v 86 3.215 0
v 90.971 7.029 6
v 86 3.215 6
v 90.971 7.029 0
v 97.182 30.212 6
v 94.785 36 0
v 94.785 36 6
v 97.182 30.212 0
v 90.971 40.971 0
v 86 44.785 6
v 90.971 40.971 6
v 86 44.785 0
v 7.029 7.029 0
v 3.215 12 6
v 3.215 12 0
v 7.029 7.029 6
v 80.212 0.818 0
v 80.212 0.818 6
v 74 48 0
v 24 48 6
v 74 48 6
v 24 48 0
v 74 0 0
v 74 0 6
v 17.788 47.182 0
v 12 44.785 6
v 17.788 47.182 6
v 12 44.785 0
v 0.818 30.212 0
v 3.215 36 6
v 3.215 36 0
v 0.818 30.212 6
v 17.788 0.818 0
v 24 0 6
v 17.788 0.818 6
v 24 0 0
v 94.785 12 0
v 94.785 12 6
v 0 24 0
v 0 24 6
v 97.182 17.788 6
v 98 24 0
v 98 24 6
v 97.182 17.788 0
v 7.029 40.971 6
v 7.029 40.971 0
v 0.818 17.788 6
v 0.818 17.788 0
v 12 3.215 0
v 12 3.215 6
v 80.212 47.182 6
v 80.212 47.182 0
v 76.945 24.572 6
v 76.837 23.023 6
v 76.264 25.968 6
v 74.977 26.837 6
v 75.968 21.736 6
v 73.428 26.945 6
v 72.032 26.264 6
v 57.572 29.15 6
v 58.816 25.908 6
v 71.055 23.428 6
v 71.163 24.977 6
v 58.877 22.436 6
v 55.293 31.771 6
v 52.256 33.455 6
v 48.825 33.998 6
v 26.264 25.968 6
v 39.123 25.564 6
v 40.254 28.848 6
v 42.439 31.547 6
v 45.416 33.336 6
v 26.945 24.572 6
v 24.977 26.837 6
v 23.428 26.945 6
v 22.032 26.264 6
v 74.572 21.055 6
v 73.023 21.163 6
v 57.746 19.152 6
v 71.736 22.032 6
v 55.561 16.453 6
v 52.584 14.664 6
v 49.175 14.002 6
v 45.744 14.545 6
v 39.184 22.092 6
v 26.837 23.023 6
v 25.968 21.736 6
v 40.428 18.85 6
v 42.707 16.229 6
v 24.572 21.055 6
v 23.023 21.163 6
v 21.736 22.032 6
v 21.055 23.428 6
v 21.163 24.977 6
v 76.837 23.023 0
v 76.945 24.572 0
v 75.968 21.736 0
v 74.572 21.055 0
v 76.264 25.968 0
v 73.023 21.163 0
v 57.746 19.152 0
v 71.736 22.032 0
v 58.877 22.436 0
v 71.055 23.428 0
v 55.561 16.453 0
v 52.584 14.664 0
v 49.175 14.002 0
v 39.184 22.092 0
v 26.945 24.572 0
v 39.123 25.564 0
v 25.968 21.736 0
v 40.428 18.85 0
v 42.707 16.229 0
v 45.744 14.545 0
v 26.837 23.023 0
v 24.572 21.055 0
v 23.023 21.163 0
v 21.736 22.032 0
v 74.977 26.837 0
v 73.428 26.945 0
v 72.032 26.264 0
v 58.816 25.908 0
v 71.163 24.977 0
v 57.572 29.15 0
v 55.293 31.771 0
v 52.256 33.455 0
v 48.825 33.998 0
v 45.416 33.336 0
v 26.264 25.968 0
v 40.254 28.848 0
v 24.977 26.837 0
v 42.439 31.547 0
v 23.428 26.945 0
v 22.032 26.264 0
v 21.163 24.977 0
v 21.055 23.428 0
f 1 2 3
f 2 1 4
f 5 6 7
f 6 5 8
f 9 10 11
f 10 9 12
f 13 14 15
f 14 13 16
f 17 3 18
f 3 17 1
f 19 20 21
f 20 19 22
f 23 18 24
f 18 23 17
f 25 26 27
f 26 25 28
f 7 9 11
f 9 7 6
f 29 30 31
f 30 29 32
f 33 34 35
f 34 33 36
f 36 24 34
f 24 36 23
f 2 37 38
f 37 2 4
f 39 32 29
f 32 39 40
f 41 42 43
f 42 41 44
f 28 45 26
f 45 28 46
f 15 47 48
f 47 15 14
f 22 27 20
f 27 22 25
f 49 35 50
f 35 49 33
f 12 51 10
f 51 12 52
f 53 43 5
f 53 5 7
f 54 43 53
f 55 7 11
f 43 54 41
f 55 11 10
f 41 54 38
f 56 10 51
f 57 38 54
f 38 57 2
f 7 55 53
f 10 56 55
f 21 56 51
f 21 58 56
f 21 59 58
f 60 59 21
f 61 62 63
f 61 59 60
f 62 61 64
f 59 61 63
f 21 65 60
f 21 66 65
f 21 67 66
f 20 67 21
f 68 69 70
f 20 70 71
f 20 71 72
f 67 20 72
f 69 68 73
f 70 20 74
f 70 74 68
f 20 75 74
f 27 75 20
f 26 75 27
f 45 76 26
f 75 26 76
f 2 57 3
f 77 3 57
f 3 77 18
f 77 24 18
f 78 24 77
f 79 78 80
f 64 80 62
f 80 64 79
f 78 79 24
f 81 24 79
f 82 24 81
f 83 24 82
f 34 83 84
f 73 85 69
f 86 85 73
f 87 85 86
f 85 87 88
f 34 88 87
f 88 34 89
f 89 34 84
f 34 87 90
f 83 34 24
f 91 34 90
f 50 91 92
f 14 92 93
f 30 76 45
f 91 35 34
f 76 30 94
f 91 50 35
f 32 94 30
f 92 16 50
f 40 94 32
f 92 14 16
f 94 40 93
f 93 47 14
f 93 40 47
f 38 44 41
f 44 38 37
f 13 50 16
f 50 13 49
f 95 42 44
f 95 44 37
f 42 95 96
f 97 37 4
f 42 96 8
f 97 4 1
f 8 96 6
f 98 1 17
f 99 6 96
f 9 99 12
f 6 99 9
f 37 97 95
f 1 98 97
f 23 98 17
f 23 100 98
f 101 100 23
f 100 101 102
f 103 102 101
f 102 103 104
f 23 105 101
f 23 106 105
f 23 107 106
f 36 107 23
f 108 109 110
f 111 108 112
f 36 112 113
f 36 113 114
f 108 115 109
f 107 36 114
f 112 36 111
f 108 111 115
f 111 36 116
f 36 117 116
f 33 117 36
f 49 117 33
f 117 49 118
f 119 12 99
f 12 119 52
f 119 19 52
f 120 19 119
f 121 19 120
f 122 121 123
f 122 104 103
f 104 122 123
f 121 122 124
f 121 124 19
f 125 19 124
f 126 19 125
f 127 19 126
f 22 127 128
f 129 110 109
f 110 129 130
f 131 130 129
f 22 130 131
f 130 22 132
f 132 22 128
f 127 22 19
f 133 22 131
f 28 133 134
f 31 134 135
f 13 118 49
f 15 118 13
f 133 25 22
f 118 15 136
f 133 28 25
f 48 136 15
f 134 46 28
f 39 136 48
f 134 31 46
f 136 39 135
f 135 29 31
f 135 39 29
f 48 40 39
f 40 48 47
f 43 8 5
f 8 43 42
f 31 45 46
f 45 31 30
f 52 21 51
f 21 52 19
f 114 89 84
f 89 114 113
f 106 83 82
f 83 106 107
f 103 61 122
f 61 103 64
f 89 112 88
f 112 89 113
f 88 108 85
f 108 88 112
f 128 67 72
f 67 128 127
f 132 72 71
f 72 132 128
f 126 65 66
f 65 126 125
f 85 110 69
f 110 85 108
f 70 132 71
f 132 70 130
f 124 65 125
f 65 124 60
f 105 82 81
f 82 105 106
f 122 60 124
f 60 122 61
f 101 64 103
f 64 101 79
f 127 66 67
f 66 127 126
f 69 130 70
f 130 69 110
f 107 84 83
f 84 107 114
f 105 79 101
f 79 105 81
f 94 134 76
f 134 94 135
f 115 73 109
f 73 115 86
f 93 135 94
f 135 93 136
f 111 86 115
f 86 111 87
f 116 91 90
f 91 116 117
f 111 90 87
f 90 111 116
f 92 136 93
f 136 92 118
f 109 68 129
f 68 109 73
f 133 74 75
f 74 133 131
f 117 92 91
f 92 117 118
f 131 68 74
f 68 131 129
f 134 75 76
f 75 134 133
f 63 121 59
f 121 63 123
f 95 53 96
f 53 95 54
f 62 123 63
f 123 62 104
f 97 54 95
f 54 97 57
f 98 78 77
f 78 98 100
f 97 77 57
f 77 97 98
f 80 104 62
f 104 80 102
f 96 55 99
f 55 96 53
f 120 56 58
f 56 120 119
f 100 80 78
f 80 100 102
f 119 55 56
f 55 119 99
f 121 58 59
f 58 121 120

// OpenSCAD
$fn = 32;

// ----------------------------------------------------------------------
// Spacer plate: obround span 50, caps R24
// ----------------------------------------------------------------------

// --- parameters (mm) ---
bore_r = 10;              // centre bore radius
bolt_r = 3;               // bolt hole radius
plate_t = 6;              // plate thickness, Z (extrusion height)
span = 50;                // obround span
cap_r = 24;               // cap radius

profile = [[24, 48], [17.788, 47.182], [12, 44.785], [7.029, 40.971], [3.215, 36], [0.818, 30.212], [0, 24], [0.818, 17.788], [3.215, 12], [7.029, 7.029], [12, 3.215], [17.788, 0.818], [24, 0], [74, 0], [80.212, 0.818], [86, 3.215], [90.971, 7.029], [94.785, 12], [97.182, 17.788], [98, 24], [97.182, 30.212], [94.785, 36], [90.971, 40.971], [86, 44.785], [80.212, 47.182], [74, 48]];  // primary outline, 26 points, counter clockwise
void_1 = [[58.816, 25.908], [57.572, 29.15], [55.293, 31.771], [52.256, 33.455], [48.825, 33.998], [45.416, 33.336], [42.439, 31.547], [40.254, 28.848], [39.123, 25.564], [39.184, 22.092], [40.428, 18.85], [42.707, 16.229], [45.744, 14.545], [49.175, 14.002], [52.584, 14.664], [55.561, 16.453], [57.746, 19.152], [58.877, 22.436]];  // centre bore, 18 points
void_2 = [[26.945, 24.572], [26.264, 25.968], [24.977, 26.837], [23.428, 26.945], [22.032, 26.264], [21.163, 24.977], [21.055, 23.428], [21.736, 22.032], [23.023, 21.163], [24.572, 21.055], [25.968, 21.736], [26.837, 23.023]];  // end hole, 12 points
void_3 = [[76.945, 24.572], [76.264, 25.968], [74.977, 26.837], [73.428, 26.945], [72.032, 26.264], [71.163, 24.977], [71.055, 23.428], [71.736, 22.032], [73.023, 21.163], [74.572, 21.055], [75.968, 21.736], [76.837, 23.023]];  // end hole, 12 points

// --- the one profile operation ---
difference() {
  linear_extrude(height = plate_t) polygon(points = profile);
  translate([0, 0, -1])
    linear_extrude(height = plate_t + 2) polygon(points = void_1);
  translate([0, 0, -1])
    linear_extrude(height = plate_t + 2) polygon(points = void_2);
  translate([0, 0, -1])
    linear_extrude(height = plate_t + 2) polygon(points = void_3);
}
